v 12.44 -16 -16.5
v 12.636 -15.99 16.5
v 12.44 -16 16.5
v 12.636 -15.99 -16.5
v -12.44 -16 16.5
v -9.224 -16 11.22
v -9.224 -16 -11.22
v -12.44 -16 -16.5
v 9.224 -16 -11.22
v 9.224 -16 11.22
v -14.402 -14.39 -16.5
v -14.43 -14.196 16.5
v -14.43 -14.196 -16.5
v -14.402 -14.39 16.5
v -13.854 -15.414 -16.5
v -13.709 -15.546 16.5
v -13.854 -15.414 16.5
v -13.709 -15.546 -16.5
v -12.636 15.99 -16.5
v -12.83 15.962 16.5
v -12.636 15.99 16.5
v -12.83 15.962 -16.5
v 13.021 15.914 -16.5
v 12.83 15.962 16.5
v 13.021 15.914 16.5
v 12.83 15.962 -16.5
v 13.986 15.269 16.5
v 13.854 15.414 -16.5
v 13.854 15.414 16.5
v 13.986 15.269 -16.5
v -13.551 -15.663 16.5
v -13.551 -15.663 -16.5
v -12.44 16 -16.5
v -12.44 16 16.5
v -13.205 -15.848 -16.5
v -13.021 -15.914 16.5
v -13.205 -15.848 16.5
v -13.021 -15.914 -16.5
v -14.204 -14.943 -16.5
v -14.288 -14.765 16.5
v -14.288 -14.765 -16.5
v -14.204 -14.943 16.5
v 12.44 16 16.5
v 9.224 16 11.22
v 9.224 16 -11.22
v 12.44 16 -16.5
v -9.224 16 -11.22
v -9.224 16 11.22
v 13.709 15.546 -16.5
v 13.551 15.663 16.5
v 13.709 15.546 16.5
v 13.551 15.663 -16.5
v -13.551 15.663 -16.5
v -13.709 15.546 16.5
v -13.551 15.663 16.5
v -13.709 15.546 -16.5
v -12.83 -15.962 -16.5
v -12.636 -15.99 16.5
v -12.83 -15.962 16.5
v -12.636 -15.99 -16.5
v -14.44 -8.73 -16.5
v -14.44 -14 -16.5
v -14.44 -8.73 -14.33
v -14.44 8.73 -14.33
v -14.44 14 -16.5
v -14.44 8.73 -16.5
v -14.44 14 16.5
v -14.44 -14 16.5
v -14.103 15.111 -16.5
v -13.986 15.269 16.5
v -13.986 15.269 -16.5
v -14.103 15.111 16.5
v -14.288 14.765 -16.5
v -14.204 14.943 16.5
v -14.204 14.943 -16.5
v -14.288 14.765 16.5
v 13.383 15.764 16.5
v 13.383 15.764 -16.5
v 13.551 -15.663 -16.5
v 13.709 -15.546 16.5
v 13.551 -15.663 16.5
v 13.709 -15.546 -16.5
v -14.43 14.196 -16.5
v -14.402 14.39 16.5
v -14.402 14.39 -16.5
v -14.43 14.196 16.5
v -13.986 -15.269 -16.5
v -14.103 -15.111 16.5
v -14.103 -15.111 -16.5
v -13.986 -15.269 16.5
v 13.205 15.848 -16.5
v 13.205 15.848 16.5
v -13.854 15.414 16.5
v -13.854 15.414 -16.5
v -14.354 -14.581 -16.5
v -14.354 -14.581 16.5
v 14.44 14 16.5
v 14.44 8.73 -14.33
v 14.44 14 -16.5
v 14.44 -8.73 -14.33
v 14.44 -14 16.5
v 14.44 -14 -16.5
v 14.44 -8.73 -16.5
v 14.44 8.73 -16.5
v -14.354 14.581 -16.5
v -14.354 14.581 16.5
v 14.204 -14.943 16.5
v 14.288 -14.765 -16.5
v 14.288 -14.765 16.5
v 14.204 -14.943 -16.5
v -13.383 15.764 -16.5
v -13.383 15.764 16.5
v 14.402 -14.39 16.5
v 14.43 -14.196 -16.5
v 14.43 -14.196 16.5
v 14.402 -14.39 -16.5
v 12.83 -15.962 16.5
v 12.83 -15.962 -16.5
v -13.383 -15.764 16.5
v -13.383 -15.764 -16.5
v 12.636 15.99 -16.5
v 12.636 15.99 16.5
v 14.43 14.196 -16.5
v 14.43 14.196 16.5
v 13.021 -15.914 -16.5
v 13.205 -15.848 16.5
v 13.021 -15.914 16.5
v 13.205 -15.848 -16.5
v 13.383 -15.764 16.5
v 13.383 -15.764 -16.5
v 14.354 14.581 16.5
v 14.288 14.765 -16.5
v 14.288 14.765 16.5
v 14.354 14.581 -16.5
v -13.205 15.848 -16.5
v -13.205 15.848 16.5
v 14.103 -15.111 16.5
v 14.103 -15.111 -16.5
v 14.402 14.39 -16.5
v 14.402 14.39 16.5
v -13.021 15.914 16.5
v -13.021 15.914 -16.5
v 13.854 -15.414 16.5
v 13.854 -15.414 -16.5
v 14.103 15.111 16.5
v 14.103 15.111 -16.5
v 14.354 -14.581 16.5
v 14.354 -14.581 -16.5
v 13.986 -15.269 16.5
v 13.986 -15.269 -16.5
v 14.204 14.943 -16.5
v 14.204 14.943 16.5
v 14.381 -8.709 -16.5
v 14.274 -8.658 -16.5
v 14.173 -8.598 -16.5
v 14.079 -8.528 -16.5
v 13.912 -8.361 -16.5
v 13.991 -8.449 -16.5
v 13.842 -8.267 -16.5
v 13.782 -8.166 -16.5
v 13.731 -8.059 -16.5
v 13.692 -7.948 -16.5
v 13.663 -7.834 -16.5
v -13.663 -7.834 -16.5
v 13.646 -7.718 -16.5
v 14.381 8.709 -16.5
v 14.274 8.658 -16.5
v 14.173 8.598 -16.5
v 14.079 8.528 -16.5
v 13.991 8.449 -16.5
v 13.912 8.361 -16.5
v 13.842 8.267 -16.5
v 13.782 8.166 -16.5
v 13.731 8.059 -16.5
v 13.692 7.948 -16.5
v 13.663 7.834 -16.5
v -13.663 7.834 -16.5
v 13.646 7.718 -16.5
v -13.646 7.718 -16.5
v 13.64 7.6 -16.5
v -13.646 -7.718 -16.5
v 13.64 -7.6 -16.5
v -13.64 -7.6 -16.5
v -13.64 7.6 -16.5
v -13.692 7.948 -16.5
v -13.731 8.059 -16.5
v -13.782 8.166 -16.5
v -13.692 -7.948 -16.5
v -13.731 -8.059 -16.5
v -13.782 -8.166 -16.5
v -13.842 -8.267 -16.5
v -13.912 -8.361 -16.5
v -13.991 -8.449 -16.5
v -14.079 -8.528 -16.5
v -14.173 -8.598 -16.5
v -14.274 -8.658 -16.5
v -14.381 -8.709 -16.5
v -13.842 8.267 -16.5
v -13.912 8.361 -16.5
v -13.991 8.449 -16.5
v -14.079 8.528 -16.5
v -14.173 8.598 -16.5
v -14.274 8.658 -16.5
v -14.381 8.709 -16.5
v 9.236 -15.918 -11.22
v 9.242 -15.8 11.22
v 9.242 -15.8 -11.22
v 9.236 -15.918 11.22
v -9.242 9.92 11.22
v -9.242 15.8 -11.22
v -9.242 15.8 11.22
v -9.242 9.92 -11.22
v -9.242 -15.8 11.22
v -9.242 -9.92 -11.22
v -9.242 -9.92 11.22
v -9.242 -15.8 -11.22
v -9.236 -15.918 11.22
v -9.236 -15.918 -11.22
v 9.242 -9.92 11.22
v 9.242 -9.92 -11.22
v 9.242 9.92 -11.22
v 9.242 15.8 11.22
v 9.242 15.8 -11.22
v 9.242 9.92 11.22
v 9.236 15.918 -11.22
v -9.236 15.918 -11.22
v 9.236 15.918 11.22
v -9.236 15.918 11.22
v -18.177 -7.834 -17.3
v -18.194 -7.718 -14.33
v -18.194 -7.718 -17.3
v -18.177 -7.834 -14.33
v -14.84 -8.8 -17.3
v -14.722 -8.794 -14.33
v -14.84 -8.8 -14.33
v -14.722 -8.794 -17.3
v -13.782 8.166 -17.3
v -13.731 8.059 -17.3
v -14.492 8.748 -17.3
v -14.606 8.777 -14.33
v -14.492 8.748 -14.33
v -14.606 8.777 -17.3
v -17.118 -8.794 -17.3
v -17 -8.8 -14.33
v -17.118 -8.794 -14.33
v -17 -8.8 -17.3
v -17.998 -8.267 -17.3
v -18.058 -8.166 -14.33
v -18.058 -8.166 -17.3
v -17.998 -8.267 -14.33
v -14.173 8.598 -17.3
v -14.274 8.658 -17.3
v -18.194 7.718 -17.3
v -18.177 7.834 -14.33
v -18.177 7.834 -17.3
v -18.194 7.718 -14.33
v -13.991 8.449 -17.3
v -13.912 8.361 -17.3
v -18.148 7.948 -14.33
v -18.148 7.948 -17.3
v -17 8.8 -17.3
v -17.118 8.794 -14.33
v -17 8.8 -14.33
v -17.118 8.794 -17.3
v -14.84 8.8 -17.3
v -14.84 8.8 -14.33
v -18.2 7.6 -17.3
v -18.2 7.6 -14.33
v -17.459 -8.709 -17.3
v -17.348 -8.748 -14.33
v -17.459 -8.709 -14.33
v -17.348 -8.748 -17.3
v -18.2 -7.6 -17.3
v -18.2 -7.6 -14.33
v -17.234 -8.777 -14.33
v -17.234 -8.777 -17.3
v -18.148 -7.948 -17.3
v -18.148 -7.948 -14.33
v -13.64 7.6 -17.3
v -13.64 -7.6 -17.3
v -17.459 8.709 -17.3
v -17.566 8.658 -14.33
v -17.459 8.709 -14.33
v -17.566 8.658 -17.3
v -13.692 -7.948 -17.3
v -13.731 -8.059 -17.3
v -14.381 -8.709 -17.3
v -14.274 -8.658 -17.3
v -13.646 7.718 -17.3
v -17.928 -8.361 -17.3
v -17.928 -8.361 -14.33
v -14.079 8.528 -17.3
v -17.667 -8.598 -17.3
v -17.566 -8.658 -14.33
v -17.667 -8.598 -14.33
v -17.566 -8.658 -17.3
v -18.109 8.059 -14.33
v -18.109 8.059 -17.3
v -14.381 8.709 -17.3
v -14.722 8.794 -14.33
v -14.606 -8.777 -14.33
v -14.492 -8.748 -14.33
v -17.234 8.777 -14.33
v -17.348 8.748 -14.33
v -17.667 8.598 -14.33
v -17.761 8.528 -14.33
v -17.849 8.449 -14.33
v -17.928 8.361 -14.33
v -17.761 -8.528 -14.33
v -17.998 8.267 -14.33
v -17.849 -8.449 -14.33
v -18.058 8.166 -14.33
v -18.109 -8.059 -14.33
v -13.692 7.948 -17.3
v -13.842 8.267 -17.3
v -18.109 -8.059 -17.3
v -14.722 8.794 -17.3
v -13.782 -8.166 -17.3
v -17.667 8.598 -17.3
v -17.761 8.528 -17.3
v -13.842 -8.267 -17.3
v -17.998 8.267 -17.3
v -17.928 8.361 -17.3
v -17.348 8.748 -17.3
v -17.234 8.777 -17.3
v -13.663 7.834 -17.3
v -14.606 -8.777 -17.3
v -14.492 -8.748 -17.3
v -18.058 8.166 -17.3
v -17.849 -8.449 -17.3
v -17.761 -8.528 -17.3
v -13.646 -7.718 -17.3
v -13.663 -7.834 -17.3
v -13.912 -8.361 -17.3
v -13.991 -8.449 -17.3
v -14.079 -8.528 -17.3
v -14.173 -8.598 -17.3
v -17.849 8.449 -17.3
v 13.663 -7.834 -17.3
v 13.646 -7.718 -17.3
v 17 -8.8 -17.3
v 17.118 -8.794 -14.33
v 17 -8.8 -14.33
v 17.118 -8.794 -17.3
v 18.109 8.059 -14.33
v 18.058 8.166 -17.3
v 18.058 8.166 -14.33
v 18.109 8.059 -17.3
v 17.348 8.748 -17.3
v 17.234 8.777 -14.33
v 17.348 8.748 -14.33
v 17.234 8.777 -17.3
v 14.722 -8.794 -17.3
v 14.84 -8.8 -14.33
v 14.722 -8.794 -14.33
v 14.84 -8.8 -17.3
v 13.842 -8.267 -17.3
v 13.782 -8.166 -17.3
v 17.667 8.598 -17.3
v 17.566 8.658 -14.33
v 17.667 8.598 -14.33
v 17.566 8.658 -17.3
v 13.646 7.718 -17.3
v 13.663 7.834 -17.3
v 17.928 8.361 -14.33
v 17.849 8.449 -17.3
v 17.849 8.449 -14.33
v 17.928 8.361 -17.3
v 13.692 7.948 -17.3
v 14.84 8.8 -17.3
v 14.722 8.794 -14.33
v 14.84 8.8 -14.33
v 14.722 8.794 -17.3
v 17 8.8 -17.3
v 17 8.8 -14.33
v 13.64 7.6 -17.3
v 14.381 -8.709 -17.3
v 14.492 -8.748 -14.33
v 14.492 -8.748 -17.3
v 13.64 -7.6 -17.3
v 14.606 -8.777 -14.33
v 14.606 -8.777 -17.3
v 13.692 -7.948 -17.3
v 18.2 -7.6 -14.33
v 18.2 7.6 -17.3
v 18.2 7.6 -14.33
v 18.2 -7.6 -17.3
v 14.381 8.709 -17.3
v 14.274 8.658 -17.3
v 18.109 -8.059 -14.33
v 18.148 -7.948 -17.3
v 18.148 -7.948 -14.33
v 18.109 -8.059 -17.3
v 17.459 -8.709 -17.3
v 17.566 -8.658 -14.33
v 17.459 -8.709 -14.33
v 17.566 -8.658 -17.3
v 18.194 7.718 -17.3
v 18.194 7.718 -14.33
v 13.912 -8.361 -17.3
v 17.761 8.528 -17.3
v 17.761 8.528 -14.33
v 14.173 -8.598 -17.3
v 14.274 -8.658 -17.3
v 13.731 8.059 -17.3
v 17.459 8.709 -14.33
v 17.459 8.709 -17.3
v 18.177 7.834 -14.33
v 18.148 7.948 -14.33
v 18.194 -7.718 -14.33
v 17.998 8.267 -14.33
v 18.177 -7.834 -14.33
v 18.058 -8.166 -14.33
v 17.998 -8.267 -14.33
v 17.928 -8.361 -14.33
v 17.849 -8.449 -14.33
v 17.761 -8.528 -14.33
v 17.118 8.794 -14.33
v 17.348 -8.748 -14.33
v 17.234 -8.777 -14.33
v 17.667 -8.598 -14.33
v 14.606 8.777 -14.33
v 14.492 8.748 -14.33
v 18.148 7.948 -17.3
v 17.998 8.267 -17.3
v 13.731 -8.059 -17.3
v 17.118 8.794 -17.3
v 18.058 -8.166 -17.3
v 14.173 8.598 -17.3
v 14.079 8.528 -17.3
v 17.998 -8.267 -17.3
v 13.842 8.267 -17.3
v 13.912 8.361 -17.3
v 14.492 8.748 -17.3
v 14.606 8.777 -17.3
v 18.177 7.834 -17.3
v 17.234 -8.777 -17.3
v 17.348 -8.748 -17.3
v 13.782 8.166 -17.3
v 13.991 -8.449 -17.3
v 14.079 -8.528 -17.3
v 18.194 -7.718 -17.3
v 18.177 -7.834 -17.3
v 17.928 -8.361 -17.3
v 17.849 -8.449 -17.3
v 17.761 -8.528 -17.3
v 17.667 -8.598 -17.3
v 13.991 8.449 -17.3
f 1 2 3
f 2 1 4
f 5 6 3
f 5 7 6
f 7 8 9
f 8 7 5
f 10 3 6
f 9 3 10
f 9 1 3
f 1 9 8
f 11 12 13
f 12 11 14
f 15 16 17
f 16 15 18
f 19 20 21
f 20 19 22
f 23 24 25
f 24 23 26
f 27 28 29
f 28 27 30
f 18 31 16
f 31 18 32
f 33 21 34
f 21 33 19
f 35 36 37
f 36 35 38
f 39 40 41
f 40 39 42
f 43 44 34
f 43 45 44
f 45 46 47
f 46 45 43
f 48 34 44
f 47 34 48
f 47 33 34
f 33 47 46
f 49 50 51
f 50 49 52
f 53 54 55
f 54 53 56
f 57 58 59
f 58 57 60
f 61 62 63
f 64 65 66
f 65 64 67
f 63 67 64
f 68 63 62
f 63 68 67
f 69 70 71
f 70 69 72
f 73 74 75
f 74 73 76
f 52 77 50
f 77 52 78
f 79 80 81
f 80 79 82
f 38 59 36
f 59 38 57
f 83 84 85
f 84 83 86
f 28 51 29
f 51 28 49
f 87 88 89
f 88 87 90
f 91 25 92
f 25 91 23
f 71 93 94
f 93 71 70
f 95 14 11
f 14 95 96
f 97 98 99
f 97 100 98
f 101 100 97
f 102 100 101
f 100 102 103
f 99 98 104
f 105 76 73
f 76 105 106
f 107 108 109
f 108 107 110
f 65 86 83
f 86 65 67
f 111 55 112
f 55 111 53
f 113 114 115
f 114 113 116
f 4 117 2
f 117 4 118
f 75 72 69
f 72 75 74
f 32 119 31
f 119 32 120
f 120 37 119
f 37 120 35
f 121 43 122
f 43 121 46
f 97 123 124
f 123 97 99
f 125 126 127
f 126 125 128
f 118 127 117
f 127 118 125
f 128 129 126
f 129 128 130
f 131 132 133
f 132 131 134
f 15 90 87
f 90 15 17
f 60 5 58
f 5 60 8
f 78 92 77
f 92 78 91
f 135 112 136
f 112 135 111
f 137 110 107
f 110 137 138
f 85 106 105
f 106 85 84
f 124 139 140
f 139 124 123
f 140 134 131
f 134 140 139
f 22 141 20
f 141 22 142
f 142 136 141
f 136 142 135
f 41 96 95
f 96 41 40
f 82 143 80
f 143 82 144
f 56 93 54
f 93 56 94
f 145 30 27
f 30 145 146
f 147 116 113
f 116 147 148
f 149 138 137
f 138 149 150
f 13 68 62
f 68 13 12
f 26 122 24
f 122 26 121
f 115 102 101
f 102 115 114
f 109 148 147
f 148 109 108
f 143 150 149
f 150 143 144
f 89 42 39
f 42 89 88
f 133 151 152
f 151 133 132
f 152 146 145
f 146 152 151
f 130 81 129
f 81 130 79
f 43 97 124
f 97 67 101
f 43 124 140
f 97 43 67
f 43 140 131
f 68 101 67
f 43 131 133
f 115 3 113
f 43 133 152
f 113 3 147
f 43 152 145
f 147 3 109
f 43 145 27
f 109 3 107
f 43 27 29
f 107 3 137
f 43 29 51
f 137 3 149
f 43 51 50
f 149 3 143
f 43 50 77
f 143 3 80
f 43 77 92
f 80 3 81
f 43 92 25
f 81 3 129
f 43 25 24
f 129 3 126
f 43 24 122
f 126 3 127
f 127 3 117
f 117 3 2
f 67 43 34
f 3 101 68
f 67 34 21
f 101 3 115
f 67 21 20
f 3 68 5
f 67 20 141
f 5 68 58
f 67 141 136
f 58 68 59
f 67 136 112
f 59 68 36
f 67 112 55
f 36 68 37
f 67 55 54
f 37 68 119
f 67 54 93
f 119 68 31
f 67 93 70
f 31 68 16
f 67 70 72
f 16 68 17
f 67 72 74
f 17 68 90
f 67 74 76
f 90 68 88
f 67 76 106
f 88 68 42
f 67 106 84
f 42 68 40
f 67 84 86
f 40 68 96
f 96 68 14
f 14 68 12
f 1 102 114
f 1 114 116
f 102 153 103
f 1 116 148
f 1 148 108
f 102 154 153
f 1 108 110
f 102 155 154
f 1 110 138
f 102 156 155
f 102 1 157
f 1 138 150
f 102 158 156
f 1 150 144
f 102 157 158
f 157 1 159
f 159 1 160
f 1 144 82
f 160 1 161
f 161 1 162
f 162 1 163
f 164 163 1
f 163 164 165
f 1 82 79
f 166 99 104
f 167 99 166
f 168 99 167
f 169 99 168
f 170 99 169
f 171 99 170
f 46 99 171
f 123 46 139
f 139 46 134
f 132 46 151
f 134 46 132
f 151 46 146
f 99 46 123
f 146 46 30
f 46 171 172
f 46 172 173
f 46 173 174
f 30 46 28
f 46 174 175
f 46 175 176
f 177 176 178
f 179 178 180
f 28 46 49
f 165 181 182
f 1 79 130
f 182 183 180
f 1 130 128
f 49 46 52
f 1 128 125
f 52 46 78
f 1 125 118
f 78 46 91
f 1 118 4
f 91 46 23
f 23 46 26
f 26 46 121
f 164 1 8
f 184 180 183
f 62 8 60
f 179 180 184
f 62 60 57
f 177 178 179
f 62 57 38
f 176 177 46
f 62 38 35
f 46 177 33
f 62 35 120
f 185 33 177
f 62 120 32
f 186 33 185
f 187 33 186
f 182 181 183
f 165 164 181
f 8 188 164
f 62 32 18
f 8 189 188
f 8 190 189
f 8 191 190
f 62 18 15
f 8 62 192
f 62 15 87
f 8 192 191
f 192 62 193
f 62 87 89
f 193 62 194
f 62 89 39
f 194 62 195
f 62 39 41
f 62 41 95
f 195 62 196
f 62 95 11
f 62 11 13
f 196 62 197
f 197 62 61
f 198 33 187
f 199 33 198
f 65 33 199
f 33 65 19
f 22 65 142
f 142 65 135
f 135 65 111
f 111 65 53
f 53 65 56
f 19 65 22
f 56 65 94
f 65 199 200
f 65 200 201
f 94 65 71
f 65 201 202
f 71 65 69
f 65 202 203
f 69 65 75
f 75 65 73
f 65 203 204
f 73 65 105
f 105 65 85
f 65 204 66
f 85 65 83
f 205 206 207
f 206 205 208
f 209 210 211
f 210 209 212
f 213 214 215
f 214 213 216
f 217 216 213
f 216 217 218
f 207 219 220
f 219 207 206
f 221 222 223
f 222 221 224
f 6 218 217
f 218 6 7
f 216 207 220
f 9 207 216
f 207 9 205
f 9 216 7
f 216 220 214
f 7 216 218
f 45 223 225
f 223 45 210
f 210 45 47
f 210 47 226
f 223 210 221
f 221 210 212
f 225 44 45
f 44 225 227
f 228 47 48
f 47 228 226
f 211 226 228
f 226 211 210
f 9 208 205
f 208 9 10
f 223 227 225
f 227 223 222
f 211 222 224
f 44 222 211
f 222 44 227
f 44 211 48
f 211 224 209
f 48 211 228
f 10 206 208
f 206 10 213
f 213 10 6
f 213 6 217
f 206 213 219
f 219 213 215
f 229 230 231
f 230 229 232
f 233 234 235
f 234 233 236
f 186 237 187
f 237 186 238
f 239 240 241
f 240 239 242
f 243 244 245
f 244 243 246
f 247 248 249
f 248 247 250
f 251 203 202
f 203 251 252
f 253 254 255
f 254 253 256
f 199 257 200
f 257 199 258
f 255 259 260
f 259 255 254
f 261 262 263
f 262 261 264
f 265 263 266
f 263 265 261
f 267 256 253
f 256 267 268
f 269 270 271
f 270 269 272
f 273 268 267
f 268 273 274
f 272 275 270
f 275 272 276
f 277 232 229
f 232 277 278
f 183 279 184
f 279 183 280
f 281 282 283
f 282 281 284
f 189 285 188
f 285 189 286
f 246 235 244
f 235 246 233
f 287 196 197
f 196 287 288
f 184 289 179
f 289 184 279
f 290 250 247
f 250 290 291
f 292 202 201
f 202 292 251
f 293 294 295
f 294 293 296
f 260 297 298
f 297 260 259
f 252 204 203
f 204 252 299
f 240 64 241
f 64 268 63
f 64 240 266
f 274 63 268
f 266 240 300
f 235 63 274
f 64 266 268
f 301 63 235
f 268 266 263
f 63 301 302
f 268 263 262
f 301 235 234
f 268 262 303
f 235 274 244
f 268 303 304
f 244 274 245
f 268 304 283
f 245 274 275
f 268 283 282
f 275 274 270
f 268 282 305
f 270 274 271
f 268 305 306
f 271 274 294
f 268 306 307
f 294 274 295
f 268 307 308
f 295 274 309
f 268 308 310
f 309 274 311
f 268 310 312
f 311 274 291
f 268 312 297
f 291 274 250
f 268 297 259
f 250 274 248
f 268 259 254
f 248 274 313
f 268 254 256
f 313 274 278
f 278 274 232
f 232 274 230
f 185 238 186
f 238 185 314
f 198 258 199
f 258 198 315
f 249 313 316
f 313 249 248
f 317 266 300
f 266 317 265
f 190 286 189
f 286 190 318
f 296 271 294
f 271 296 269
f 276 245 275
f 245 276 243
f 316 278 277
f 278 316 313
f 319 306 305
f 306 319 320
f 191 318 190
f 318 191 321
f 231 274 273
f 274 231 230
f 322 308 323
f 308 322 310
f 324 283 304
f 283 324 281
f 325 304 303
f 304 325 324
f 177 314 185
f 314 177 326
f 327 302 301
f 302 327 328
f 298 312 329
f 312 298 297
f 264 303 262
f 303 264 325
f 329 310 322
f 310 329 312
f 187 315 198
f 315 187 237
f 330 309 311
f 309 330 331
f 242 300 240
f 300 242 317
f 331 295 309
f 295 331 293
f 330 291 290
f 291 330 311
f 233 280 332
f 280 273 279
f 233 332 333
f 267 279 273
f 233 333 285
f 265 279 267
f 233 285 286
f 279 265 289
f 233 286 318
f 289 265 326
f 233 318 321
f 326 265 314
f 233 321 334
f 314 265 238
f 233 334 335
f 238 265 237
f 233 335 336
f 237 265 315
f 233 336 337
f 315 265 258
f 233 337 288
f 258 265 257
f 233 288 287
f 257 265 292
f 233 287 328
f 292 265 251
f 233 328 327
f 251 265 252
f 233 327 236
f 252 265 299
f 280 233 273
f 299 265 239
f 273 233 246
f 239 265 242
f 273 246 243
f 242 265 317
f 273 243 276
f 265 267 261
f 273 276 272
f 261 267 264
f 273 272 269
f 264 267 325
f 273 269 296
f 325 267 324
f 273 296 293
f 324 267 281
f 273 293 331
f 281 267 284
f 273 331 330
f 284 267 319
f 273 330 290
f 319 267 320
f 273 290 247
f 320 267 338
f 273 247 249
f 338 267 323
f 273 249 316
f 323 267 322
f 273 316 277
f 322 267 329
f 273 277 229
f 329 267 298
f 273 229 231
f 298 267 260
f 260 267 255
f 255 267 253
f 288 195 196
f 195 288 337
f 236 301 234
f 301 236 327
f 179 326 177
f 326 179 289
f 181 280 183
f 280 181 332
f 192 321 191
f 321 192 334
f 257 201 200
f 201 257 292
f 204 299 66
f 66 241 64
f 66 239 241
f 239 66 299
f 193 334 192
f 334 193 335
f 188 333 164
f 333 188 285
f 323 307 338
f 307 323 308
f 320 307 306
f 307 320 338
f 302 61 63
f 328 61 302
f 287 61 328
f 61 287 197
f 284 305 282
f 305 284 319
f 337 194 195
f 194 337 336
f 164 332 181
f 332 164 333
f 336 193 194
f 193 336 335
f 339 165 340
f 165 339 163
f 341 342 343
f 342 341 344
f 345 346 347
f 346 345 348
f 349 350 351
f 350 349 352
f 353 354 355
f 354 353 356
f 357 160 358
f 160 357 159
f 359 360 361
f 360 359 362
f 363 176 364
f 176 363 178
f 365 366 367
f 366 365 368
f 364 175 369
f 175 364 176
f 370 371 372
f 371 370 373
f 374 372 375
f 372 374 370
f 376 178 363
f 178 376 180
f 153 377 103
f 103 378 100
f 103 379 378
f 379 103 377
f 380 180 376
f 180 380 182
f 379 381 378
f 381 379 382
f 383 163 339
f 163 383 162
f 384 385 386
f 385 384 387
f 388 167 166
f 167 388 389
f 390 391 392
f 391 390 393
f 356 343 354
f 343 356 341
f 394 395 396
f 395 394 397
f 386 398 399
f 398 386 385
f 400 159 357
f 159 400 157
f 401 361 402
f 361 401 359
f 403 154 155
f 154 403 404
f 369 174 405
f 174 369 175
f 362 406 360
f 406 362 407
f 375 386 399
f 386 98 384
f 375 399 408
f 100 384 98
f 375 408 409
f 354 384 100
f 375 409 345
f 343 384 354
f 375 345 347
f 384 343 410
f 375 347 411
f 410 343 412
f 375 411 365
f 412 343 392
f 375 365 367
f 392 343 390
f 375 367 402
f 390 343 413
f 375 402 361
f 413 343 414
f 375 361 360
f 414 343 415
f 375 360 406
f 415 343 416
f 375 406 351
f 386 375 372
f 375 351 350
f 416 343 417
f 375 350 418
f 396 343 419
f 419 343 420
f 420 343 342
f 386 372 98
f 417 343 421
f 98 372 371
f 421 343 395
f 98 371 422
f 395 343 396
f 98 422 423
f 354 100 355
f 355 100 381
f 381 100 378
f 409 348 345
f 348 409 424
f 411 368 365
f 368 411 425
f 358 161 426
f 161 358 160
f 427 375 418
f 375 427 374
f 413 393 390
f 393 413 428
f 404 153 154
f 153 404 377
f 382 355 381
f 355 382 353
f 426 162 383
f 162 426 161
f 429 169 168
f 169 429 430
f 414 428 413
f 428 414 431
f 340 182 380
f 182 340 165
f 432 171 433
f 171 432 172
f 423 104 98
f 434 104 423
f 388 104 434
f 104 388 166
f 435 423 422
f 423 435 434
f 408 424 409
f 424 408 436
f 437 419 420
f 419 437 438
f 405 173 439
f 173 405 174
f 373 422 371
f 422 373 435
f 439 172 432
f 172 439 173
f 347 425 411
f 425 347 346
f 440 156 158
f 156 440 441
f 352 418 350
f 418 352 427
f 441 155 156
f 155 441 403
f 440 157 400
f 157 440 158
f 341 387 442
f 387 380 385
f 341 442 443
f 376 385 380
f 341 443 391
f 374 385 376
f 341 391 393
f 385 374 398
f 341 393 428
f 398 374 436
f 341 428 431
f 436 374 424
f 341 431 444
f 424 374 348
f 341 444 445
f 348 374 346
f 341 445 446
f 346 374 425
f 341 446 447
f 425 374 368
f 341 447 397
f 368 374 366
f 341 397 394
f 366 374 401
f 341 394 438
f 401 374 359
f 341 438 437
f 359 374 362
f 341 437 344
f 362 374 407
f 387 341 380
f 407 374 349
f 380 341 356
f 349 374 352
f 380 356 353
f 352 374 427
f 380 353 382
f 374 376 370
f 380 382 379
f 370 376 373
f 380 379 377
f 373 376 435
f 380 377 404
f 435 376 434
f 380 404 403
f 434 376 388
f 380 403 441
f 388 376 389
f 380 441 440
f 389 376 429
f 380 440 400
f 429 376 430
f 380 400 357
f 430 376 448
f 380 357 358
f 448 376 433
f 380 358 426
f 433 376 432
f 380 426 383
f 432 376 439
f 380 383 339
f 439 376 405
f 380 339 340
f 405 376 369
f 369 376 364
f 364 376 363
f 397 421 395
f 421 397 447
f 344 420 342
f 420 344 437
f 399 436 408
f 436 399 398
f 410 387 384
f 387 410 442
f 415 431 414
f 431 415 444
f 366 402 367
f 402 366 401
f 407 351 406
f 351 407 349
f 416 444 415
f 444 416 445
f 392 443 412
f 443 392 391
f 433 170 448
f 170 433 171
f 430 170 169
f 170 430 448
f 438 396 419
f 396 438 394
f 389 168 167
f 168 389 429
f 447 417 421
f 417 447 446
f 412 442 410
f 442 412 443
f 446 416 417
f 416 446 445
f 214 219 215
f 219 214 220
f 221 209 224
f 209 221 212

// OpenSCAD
$fn = 64;

// Rounded rectangular prism (centered)
module rrect_prism(size=[10,10,10], r=1) {
    x=size[0]; y=size[1]; z=size[2];
    r2 = min(r, min(x,y)/2);
    linear_extrude(height=z, center=true)
        offset(r=r2)
            square([x-2*r2, y-2*r2], center=true);
}

// Mains transformer with core window, bobbin, mounting feet, and leads.
// Overall envelope matches body=[38,32,33] (X,Y,Z).
module transformer(body=[38,32,33], corner_r=2.0) {
    x = body[0];
    y = body[1];
    z = body[2];

    overlap = 0.8; // connectivity overlap

    // Feet: extend in X but keep overall X within x by shrinking main body accordingly
    foot_ext = x*0.12;                 // extension per side
    foot_w   = foot_ext;               // foot thickness in X
    foot_y   = y*0.55;                 // foot depth in Y
    foot_t   = max(2.0, z*0.09);       // foot thickness in Z
    foot_r   = min(1.2, corner_r);

    // Main body reduced so feet bring total X back to x
    core_x = x - 2*foot_ext;
    core_y = y;
    core_z = z;

    // Core window: through in Y, leaving top/bottom yokes in Z and side legs in X
    leg_x   = max(3.0, core_x*0.18);
    yoke_z  = max(3.0, core_z*0.16);
    win_x   = max(2.0, core_x - 2*leg_x);
    win_y   = y + 2;                   // ensure full cut-through in Y
    win_z   = max(2.0, core_z - 2*yoke_z);

    // Bobbin/winding pack (kept inside overall envelope)
    bob_x = max(6.0, win_x + 2*max(2.0, core_x*0.08));
    bob_y = y*0.62;
    bob_z = core_z*0.78;

    // Leads exiting +Y side, attached to bobbin
    lead_r      = 0.7;
    lead_len    = y*0.22;
    lead_z_off  = -core_z/2 + core_z*0.22;
    lead_x_span = bob_x*0.55;

    union() {
        // Laminated core block with window
        difference() {
            rrect_prism([core_x, core_y, core_z], r=corner_r);

            // Window cut: centered, through Y
            rrect_prism([win_x, win_y, win_z], r=corner_r*0.6);
        }

        // Bobbin/winding pack (overlaps into core for connectivity)
        rrect_prism([bob_x, bob_y, bob_z], r=corner_r*0.8);

        // Mounting feet (tabs) on left and right, attached at bottom
        for (sx = [-1, 1]) {
            translate([
                sx*(core_x/2 + foot_w/2 - overlap),
                0,
                -(core_z/2 - foot_t/2 + overlap)
            ])
                rrect_prism([foot_w, foot_y, foot_t], r=foot_r);
        }

        // Leads/terminals: two cylinders exiting +Y, overlapping into bobbin
        for (sx = [-1, 1]) {
            translate([sx*lead_x_span/2, (bob_y/2 - overlap), lead_z_off])
                rotate([90, 0, 0])
                    cylinder(h=lead_len, r=lead_r, center=false);
        }
    }
}

transformer([38.0, 32.0, 33.0], corner_r=2.0);
